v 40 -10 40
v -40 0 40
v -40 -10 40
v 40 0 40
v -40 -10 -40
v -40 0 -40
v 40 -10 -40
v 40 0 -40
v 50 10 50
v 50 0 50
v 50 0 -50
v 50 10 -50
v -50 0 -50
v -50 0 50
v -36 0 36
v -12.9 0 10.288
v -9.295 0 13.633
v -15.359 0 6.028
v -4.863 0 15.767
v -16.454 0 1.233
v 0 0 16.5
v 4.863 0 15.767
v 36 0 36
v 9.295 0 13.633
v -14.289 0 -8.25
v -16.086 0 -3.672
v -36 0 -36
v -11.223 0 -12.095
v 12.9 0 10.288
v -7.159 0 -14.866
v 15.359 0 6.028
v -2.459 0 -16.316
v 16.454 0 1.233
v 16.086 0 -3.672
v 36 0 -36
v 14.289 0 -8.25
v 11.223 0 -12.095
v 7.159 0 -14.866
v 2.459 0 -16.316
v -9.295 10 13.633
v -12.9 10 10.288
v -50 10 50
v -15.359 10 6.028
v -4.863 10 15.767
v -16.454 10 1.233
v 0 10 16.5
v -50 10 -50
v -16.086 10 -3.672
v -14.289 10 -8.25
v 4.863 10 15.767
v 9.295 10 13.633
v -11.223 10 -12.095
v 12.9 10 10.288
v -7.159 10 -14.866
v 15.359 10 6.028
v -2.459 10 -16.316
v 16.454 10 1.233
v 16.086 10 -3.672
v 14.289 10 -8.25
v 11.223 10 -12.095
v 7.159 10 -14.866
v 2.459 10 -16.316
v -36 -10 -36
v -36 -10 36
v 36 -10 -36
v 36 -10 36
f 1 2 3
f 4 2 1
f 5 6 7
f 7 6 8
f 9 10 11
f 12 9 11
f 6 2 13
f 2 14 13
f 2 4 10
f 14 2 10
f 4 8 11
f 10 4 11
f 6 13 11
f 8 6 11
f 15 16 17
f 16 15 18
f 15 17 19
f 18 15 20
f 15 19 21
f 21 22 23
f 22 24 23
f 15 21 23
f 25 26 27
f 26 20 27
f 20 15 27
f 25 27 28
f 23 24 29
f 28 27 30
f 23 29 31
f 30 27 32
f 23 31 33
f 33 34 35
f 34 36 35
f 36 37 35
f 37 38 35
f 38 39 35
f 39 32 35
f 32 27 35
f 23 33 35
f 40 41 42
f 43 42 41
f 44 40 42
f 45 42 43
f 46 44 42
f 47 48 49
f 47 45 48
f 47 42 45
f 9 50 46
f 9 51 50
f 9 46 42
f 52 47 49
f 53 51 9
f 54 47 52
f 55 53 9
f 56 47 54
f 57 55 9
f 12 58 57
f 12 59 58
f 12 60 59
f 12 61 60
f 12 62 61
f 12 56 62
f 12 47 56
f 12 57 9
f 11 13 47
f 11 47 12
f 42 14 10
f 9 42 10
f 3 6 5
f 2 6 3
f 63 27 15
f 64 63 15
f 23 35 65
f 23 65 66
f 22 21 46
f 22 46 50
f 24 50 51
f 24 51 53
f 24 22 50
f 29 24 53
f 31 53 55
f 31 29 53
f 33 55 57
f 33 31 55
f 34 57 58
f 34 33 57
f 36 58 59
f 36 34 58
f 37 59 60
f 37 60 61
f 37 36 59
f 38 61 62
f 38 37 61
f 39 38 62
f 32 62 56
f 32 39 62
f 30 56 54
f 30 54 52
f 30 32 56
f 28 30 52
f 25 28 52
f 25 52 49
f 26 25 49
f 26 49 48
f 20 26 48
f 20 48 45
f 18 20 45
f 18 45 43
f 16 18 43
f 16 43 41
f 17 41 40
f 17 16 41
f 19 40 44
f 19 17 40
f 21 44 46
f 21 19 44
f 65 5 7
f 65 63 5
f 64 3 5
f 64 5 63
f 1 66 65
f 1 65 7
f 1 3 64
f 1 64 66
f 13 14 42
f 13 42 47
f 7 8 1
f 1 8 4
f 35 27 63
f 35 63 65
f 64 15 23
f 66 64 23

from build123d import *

# Parameters (mm, degrees)
SKETCH1_W           = 100
SKETCH1_H           = 100
SKETCH1_R           = 16.5
BOSS_EXTRUDE1_DEPTH = 10
SKETCH3_W           = 80
SKETCH3_H           = 80
SKETCH3_W_2         = 72
SKETCH3_H_2         = 72
BOSS_EXTRUDE2_DEPTH = 10


with BuildPart() as part:
    # Sketch1 → Boss-Extrude1 (new body)
    with BuildSketch(Plane(origin=(0, 0, 0), x_dir=(1, 0, 0), z_dir=(0, 1, 0))):
        Rectangle(SKETCH1_W, SKETCH1_H)
        with Locations(Location((0, 0, 0), (0, 0, 270))):
            Circle(SKETCH1_R, mode=Mode.SUBTRACT)
    extrude(amount=BOSS_EXTRUDE1_DEPTH)

    # Sketch3 → Boss-Extrude2 (add)
    with BuildSketch(Plane.XZ):
        Rectangle(SKETCH3_W, SKETCH3_H)
        Rectangle(SKETCH3_W_2, SKETCH3_H_2, mode=Mode.SUBTRACT)
    extrude(amount=BOSS_EXTRUDE2_DEPTH)


solid = part.part
